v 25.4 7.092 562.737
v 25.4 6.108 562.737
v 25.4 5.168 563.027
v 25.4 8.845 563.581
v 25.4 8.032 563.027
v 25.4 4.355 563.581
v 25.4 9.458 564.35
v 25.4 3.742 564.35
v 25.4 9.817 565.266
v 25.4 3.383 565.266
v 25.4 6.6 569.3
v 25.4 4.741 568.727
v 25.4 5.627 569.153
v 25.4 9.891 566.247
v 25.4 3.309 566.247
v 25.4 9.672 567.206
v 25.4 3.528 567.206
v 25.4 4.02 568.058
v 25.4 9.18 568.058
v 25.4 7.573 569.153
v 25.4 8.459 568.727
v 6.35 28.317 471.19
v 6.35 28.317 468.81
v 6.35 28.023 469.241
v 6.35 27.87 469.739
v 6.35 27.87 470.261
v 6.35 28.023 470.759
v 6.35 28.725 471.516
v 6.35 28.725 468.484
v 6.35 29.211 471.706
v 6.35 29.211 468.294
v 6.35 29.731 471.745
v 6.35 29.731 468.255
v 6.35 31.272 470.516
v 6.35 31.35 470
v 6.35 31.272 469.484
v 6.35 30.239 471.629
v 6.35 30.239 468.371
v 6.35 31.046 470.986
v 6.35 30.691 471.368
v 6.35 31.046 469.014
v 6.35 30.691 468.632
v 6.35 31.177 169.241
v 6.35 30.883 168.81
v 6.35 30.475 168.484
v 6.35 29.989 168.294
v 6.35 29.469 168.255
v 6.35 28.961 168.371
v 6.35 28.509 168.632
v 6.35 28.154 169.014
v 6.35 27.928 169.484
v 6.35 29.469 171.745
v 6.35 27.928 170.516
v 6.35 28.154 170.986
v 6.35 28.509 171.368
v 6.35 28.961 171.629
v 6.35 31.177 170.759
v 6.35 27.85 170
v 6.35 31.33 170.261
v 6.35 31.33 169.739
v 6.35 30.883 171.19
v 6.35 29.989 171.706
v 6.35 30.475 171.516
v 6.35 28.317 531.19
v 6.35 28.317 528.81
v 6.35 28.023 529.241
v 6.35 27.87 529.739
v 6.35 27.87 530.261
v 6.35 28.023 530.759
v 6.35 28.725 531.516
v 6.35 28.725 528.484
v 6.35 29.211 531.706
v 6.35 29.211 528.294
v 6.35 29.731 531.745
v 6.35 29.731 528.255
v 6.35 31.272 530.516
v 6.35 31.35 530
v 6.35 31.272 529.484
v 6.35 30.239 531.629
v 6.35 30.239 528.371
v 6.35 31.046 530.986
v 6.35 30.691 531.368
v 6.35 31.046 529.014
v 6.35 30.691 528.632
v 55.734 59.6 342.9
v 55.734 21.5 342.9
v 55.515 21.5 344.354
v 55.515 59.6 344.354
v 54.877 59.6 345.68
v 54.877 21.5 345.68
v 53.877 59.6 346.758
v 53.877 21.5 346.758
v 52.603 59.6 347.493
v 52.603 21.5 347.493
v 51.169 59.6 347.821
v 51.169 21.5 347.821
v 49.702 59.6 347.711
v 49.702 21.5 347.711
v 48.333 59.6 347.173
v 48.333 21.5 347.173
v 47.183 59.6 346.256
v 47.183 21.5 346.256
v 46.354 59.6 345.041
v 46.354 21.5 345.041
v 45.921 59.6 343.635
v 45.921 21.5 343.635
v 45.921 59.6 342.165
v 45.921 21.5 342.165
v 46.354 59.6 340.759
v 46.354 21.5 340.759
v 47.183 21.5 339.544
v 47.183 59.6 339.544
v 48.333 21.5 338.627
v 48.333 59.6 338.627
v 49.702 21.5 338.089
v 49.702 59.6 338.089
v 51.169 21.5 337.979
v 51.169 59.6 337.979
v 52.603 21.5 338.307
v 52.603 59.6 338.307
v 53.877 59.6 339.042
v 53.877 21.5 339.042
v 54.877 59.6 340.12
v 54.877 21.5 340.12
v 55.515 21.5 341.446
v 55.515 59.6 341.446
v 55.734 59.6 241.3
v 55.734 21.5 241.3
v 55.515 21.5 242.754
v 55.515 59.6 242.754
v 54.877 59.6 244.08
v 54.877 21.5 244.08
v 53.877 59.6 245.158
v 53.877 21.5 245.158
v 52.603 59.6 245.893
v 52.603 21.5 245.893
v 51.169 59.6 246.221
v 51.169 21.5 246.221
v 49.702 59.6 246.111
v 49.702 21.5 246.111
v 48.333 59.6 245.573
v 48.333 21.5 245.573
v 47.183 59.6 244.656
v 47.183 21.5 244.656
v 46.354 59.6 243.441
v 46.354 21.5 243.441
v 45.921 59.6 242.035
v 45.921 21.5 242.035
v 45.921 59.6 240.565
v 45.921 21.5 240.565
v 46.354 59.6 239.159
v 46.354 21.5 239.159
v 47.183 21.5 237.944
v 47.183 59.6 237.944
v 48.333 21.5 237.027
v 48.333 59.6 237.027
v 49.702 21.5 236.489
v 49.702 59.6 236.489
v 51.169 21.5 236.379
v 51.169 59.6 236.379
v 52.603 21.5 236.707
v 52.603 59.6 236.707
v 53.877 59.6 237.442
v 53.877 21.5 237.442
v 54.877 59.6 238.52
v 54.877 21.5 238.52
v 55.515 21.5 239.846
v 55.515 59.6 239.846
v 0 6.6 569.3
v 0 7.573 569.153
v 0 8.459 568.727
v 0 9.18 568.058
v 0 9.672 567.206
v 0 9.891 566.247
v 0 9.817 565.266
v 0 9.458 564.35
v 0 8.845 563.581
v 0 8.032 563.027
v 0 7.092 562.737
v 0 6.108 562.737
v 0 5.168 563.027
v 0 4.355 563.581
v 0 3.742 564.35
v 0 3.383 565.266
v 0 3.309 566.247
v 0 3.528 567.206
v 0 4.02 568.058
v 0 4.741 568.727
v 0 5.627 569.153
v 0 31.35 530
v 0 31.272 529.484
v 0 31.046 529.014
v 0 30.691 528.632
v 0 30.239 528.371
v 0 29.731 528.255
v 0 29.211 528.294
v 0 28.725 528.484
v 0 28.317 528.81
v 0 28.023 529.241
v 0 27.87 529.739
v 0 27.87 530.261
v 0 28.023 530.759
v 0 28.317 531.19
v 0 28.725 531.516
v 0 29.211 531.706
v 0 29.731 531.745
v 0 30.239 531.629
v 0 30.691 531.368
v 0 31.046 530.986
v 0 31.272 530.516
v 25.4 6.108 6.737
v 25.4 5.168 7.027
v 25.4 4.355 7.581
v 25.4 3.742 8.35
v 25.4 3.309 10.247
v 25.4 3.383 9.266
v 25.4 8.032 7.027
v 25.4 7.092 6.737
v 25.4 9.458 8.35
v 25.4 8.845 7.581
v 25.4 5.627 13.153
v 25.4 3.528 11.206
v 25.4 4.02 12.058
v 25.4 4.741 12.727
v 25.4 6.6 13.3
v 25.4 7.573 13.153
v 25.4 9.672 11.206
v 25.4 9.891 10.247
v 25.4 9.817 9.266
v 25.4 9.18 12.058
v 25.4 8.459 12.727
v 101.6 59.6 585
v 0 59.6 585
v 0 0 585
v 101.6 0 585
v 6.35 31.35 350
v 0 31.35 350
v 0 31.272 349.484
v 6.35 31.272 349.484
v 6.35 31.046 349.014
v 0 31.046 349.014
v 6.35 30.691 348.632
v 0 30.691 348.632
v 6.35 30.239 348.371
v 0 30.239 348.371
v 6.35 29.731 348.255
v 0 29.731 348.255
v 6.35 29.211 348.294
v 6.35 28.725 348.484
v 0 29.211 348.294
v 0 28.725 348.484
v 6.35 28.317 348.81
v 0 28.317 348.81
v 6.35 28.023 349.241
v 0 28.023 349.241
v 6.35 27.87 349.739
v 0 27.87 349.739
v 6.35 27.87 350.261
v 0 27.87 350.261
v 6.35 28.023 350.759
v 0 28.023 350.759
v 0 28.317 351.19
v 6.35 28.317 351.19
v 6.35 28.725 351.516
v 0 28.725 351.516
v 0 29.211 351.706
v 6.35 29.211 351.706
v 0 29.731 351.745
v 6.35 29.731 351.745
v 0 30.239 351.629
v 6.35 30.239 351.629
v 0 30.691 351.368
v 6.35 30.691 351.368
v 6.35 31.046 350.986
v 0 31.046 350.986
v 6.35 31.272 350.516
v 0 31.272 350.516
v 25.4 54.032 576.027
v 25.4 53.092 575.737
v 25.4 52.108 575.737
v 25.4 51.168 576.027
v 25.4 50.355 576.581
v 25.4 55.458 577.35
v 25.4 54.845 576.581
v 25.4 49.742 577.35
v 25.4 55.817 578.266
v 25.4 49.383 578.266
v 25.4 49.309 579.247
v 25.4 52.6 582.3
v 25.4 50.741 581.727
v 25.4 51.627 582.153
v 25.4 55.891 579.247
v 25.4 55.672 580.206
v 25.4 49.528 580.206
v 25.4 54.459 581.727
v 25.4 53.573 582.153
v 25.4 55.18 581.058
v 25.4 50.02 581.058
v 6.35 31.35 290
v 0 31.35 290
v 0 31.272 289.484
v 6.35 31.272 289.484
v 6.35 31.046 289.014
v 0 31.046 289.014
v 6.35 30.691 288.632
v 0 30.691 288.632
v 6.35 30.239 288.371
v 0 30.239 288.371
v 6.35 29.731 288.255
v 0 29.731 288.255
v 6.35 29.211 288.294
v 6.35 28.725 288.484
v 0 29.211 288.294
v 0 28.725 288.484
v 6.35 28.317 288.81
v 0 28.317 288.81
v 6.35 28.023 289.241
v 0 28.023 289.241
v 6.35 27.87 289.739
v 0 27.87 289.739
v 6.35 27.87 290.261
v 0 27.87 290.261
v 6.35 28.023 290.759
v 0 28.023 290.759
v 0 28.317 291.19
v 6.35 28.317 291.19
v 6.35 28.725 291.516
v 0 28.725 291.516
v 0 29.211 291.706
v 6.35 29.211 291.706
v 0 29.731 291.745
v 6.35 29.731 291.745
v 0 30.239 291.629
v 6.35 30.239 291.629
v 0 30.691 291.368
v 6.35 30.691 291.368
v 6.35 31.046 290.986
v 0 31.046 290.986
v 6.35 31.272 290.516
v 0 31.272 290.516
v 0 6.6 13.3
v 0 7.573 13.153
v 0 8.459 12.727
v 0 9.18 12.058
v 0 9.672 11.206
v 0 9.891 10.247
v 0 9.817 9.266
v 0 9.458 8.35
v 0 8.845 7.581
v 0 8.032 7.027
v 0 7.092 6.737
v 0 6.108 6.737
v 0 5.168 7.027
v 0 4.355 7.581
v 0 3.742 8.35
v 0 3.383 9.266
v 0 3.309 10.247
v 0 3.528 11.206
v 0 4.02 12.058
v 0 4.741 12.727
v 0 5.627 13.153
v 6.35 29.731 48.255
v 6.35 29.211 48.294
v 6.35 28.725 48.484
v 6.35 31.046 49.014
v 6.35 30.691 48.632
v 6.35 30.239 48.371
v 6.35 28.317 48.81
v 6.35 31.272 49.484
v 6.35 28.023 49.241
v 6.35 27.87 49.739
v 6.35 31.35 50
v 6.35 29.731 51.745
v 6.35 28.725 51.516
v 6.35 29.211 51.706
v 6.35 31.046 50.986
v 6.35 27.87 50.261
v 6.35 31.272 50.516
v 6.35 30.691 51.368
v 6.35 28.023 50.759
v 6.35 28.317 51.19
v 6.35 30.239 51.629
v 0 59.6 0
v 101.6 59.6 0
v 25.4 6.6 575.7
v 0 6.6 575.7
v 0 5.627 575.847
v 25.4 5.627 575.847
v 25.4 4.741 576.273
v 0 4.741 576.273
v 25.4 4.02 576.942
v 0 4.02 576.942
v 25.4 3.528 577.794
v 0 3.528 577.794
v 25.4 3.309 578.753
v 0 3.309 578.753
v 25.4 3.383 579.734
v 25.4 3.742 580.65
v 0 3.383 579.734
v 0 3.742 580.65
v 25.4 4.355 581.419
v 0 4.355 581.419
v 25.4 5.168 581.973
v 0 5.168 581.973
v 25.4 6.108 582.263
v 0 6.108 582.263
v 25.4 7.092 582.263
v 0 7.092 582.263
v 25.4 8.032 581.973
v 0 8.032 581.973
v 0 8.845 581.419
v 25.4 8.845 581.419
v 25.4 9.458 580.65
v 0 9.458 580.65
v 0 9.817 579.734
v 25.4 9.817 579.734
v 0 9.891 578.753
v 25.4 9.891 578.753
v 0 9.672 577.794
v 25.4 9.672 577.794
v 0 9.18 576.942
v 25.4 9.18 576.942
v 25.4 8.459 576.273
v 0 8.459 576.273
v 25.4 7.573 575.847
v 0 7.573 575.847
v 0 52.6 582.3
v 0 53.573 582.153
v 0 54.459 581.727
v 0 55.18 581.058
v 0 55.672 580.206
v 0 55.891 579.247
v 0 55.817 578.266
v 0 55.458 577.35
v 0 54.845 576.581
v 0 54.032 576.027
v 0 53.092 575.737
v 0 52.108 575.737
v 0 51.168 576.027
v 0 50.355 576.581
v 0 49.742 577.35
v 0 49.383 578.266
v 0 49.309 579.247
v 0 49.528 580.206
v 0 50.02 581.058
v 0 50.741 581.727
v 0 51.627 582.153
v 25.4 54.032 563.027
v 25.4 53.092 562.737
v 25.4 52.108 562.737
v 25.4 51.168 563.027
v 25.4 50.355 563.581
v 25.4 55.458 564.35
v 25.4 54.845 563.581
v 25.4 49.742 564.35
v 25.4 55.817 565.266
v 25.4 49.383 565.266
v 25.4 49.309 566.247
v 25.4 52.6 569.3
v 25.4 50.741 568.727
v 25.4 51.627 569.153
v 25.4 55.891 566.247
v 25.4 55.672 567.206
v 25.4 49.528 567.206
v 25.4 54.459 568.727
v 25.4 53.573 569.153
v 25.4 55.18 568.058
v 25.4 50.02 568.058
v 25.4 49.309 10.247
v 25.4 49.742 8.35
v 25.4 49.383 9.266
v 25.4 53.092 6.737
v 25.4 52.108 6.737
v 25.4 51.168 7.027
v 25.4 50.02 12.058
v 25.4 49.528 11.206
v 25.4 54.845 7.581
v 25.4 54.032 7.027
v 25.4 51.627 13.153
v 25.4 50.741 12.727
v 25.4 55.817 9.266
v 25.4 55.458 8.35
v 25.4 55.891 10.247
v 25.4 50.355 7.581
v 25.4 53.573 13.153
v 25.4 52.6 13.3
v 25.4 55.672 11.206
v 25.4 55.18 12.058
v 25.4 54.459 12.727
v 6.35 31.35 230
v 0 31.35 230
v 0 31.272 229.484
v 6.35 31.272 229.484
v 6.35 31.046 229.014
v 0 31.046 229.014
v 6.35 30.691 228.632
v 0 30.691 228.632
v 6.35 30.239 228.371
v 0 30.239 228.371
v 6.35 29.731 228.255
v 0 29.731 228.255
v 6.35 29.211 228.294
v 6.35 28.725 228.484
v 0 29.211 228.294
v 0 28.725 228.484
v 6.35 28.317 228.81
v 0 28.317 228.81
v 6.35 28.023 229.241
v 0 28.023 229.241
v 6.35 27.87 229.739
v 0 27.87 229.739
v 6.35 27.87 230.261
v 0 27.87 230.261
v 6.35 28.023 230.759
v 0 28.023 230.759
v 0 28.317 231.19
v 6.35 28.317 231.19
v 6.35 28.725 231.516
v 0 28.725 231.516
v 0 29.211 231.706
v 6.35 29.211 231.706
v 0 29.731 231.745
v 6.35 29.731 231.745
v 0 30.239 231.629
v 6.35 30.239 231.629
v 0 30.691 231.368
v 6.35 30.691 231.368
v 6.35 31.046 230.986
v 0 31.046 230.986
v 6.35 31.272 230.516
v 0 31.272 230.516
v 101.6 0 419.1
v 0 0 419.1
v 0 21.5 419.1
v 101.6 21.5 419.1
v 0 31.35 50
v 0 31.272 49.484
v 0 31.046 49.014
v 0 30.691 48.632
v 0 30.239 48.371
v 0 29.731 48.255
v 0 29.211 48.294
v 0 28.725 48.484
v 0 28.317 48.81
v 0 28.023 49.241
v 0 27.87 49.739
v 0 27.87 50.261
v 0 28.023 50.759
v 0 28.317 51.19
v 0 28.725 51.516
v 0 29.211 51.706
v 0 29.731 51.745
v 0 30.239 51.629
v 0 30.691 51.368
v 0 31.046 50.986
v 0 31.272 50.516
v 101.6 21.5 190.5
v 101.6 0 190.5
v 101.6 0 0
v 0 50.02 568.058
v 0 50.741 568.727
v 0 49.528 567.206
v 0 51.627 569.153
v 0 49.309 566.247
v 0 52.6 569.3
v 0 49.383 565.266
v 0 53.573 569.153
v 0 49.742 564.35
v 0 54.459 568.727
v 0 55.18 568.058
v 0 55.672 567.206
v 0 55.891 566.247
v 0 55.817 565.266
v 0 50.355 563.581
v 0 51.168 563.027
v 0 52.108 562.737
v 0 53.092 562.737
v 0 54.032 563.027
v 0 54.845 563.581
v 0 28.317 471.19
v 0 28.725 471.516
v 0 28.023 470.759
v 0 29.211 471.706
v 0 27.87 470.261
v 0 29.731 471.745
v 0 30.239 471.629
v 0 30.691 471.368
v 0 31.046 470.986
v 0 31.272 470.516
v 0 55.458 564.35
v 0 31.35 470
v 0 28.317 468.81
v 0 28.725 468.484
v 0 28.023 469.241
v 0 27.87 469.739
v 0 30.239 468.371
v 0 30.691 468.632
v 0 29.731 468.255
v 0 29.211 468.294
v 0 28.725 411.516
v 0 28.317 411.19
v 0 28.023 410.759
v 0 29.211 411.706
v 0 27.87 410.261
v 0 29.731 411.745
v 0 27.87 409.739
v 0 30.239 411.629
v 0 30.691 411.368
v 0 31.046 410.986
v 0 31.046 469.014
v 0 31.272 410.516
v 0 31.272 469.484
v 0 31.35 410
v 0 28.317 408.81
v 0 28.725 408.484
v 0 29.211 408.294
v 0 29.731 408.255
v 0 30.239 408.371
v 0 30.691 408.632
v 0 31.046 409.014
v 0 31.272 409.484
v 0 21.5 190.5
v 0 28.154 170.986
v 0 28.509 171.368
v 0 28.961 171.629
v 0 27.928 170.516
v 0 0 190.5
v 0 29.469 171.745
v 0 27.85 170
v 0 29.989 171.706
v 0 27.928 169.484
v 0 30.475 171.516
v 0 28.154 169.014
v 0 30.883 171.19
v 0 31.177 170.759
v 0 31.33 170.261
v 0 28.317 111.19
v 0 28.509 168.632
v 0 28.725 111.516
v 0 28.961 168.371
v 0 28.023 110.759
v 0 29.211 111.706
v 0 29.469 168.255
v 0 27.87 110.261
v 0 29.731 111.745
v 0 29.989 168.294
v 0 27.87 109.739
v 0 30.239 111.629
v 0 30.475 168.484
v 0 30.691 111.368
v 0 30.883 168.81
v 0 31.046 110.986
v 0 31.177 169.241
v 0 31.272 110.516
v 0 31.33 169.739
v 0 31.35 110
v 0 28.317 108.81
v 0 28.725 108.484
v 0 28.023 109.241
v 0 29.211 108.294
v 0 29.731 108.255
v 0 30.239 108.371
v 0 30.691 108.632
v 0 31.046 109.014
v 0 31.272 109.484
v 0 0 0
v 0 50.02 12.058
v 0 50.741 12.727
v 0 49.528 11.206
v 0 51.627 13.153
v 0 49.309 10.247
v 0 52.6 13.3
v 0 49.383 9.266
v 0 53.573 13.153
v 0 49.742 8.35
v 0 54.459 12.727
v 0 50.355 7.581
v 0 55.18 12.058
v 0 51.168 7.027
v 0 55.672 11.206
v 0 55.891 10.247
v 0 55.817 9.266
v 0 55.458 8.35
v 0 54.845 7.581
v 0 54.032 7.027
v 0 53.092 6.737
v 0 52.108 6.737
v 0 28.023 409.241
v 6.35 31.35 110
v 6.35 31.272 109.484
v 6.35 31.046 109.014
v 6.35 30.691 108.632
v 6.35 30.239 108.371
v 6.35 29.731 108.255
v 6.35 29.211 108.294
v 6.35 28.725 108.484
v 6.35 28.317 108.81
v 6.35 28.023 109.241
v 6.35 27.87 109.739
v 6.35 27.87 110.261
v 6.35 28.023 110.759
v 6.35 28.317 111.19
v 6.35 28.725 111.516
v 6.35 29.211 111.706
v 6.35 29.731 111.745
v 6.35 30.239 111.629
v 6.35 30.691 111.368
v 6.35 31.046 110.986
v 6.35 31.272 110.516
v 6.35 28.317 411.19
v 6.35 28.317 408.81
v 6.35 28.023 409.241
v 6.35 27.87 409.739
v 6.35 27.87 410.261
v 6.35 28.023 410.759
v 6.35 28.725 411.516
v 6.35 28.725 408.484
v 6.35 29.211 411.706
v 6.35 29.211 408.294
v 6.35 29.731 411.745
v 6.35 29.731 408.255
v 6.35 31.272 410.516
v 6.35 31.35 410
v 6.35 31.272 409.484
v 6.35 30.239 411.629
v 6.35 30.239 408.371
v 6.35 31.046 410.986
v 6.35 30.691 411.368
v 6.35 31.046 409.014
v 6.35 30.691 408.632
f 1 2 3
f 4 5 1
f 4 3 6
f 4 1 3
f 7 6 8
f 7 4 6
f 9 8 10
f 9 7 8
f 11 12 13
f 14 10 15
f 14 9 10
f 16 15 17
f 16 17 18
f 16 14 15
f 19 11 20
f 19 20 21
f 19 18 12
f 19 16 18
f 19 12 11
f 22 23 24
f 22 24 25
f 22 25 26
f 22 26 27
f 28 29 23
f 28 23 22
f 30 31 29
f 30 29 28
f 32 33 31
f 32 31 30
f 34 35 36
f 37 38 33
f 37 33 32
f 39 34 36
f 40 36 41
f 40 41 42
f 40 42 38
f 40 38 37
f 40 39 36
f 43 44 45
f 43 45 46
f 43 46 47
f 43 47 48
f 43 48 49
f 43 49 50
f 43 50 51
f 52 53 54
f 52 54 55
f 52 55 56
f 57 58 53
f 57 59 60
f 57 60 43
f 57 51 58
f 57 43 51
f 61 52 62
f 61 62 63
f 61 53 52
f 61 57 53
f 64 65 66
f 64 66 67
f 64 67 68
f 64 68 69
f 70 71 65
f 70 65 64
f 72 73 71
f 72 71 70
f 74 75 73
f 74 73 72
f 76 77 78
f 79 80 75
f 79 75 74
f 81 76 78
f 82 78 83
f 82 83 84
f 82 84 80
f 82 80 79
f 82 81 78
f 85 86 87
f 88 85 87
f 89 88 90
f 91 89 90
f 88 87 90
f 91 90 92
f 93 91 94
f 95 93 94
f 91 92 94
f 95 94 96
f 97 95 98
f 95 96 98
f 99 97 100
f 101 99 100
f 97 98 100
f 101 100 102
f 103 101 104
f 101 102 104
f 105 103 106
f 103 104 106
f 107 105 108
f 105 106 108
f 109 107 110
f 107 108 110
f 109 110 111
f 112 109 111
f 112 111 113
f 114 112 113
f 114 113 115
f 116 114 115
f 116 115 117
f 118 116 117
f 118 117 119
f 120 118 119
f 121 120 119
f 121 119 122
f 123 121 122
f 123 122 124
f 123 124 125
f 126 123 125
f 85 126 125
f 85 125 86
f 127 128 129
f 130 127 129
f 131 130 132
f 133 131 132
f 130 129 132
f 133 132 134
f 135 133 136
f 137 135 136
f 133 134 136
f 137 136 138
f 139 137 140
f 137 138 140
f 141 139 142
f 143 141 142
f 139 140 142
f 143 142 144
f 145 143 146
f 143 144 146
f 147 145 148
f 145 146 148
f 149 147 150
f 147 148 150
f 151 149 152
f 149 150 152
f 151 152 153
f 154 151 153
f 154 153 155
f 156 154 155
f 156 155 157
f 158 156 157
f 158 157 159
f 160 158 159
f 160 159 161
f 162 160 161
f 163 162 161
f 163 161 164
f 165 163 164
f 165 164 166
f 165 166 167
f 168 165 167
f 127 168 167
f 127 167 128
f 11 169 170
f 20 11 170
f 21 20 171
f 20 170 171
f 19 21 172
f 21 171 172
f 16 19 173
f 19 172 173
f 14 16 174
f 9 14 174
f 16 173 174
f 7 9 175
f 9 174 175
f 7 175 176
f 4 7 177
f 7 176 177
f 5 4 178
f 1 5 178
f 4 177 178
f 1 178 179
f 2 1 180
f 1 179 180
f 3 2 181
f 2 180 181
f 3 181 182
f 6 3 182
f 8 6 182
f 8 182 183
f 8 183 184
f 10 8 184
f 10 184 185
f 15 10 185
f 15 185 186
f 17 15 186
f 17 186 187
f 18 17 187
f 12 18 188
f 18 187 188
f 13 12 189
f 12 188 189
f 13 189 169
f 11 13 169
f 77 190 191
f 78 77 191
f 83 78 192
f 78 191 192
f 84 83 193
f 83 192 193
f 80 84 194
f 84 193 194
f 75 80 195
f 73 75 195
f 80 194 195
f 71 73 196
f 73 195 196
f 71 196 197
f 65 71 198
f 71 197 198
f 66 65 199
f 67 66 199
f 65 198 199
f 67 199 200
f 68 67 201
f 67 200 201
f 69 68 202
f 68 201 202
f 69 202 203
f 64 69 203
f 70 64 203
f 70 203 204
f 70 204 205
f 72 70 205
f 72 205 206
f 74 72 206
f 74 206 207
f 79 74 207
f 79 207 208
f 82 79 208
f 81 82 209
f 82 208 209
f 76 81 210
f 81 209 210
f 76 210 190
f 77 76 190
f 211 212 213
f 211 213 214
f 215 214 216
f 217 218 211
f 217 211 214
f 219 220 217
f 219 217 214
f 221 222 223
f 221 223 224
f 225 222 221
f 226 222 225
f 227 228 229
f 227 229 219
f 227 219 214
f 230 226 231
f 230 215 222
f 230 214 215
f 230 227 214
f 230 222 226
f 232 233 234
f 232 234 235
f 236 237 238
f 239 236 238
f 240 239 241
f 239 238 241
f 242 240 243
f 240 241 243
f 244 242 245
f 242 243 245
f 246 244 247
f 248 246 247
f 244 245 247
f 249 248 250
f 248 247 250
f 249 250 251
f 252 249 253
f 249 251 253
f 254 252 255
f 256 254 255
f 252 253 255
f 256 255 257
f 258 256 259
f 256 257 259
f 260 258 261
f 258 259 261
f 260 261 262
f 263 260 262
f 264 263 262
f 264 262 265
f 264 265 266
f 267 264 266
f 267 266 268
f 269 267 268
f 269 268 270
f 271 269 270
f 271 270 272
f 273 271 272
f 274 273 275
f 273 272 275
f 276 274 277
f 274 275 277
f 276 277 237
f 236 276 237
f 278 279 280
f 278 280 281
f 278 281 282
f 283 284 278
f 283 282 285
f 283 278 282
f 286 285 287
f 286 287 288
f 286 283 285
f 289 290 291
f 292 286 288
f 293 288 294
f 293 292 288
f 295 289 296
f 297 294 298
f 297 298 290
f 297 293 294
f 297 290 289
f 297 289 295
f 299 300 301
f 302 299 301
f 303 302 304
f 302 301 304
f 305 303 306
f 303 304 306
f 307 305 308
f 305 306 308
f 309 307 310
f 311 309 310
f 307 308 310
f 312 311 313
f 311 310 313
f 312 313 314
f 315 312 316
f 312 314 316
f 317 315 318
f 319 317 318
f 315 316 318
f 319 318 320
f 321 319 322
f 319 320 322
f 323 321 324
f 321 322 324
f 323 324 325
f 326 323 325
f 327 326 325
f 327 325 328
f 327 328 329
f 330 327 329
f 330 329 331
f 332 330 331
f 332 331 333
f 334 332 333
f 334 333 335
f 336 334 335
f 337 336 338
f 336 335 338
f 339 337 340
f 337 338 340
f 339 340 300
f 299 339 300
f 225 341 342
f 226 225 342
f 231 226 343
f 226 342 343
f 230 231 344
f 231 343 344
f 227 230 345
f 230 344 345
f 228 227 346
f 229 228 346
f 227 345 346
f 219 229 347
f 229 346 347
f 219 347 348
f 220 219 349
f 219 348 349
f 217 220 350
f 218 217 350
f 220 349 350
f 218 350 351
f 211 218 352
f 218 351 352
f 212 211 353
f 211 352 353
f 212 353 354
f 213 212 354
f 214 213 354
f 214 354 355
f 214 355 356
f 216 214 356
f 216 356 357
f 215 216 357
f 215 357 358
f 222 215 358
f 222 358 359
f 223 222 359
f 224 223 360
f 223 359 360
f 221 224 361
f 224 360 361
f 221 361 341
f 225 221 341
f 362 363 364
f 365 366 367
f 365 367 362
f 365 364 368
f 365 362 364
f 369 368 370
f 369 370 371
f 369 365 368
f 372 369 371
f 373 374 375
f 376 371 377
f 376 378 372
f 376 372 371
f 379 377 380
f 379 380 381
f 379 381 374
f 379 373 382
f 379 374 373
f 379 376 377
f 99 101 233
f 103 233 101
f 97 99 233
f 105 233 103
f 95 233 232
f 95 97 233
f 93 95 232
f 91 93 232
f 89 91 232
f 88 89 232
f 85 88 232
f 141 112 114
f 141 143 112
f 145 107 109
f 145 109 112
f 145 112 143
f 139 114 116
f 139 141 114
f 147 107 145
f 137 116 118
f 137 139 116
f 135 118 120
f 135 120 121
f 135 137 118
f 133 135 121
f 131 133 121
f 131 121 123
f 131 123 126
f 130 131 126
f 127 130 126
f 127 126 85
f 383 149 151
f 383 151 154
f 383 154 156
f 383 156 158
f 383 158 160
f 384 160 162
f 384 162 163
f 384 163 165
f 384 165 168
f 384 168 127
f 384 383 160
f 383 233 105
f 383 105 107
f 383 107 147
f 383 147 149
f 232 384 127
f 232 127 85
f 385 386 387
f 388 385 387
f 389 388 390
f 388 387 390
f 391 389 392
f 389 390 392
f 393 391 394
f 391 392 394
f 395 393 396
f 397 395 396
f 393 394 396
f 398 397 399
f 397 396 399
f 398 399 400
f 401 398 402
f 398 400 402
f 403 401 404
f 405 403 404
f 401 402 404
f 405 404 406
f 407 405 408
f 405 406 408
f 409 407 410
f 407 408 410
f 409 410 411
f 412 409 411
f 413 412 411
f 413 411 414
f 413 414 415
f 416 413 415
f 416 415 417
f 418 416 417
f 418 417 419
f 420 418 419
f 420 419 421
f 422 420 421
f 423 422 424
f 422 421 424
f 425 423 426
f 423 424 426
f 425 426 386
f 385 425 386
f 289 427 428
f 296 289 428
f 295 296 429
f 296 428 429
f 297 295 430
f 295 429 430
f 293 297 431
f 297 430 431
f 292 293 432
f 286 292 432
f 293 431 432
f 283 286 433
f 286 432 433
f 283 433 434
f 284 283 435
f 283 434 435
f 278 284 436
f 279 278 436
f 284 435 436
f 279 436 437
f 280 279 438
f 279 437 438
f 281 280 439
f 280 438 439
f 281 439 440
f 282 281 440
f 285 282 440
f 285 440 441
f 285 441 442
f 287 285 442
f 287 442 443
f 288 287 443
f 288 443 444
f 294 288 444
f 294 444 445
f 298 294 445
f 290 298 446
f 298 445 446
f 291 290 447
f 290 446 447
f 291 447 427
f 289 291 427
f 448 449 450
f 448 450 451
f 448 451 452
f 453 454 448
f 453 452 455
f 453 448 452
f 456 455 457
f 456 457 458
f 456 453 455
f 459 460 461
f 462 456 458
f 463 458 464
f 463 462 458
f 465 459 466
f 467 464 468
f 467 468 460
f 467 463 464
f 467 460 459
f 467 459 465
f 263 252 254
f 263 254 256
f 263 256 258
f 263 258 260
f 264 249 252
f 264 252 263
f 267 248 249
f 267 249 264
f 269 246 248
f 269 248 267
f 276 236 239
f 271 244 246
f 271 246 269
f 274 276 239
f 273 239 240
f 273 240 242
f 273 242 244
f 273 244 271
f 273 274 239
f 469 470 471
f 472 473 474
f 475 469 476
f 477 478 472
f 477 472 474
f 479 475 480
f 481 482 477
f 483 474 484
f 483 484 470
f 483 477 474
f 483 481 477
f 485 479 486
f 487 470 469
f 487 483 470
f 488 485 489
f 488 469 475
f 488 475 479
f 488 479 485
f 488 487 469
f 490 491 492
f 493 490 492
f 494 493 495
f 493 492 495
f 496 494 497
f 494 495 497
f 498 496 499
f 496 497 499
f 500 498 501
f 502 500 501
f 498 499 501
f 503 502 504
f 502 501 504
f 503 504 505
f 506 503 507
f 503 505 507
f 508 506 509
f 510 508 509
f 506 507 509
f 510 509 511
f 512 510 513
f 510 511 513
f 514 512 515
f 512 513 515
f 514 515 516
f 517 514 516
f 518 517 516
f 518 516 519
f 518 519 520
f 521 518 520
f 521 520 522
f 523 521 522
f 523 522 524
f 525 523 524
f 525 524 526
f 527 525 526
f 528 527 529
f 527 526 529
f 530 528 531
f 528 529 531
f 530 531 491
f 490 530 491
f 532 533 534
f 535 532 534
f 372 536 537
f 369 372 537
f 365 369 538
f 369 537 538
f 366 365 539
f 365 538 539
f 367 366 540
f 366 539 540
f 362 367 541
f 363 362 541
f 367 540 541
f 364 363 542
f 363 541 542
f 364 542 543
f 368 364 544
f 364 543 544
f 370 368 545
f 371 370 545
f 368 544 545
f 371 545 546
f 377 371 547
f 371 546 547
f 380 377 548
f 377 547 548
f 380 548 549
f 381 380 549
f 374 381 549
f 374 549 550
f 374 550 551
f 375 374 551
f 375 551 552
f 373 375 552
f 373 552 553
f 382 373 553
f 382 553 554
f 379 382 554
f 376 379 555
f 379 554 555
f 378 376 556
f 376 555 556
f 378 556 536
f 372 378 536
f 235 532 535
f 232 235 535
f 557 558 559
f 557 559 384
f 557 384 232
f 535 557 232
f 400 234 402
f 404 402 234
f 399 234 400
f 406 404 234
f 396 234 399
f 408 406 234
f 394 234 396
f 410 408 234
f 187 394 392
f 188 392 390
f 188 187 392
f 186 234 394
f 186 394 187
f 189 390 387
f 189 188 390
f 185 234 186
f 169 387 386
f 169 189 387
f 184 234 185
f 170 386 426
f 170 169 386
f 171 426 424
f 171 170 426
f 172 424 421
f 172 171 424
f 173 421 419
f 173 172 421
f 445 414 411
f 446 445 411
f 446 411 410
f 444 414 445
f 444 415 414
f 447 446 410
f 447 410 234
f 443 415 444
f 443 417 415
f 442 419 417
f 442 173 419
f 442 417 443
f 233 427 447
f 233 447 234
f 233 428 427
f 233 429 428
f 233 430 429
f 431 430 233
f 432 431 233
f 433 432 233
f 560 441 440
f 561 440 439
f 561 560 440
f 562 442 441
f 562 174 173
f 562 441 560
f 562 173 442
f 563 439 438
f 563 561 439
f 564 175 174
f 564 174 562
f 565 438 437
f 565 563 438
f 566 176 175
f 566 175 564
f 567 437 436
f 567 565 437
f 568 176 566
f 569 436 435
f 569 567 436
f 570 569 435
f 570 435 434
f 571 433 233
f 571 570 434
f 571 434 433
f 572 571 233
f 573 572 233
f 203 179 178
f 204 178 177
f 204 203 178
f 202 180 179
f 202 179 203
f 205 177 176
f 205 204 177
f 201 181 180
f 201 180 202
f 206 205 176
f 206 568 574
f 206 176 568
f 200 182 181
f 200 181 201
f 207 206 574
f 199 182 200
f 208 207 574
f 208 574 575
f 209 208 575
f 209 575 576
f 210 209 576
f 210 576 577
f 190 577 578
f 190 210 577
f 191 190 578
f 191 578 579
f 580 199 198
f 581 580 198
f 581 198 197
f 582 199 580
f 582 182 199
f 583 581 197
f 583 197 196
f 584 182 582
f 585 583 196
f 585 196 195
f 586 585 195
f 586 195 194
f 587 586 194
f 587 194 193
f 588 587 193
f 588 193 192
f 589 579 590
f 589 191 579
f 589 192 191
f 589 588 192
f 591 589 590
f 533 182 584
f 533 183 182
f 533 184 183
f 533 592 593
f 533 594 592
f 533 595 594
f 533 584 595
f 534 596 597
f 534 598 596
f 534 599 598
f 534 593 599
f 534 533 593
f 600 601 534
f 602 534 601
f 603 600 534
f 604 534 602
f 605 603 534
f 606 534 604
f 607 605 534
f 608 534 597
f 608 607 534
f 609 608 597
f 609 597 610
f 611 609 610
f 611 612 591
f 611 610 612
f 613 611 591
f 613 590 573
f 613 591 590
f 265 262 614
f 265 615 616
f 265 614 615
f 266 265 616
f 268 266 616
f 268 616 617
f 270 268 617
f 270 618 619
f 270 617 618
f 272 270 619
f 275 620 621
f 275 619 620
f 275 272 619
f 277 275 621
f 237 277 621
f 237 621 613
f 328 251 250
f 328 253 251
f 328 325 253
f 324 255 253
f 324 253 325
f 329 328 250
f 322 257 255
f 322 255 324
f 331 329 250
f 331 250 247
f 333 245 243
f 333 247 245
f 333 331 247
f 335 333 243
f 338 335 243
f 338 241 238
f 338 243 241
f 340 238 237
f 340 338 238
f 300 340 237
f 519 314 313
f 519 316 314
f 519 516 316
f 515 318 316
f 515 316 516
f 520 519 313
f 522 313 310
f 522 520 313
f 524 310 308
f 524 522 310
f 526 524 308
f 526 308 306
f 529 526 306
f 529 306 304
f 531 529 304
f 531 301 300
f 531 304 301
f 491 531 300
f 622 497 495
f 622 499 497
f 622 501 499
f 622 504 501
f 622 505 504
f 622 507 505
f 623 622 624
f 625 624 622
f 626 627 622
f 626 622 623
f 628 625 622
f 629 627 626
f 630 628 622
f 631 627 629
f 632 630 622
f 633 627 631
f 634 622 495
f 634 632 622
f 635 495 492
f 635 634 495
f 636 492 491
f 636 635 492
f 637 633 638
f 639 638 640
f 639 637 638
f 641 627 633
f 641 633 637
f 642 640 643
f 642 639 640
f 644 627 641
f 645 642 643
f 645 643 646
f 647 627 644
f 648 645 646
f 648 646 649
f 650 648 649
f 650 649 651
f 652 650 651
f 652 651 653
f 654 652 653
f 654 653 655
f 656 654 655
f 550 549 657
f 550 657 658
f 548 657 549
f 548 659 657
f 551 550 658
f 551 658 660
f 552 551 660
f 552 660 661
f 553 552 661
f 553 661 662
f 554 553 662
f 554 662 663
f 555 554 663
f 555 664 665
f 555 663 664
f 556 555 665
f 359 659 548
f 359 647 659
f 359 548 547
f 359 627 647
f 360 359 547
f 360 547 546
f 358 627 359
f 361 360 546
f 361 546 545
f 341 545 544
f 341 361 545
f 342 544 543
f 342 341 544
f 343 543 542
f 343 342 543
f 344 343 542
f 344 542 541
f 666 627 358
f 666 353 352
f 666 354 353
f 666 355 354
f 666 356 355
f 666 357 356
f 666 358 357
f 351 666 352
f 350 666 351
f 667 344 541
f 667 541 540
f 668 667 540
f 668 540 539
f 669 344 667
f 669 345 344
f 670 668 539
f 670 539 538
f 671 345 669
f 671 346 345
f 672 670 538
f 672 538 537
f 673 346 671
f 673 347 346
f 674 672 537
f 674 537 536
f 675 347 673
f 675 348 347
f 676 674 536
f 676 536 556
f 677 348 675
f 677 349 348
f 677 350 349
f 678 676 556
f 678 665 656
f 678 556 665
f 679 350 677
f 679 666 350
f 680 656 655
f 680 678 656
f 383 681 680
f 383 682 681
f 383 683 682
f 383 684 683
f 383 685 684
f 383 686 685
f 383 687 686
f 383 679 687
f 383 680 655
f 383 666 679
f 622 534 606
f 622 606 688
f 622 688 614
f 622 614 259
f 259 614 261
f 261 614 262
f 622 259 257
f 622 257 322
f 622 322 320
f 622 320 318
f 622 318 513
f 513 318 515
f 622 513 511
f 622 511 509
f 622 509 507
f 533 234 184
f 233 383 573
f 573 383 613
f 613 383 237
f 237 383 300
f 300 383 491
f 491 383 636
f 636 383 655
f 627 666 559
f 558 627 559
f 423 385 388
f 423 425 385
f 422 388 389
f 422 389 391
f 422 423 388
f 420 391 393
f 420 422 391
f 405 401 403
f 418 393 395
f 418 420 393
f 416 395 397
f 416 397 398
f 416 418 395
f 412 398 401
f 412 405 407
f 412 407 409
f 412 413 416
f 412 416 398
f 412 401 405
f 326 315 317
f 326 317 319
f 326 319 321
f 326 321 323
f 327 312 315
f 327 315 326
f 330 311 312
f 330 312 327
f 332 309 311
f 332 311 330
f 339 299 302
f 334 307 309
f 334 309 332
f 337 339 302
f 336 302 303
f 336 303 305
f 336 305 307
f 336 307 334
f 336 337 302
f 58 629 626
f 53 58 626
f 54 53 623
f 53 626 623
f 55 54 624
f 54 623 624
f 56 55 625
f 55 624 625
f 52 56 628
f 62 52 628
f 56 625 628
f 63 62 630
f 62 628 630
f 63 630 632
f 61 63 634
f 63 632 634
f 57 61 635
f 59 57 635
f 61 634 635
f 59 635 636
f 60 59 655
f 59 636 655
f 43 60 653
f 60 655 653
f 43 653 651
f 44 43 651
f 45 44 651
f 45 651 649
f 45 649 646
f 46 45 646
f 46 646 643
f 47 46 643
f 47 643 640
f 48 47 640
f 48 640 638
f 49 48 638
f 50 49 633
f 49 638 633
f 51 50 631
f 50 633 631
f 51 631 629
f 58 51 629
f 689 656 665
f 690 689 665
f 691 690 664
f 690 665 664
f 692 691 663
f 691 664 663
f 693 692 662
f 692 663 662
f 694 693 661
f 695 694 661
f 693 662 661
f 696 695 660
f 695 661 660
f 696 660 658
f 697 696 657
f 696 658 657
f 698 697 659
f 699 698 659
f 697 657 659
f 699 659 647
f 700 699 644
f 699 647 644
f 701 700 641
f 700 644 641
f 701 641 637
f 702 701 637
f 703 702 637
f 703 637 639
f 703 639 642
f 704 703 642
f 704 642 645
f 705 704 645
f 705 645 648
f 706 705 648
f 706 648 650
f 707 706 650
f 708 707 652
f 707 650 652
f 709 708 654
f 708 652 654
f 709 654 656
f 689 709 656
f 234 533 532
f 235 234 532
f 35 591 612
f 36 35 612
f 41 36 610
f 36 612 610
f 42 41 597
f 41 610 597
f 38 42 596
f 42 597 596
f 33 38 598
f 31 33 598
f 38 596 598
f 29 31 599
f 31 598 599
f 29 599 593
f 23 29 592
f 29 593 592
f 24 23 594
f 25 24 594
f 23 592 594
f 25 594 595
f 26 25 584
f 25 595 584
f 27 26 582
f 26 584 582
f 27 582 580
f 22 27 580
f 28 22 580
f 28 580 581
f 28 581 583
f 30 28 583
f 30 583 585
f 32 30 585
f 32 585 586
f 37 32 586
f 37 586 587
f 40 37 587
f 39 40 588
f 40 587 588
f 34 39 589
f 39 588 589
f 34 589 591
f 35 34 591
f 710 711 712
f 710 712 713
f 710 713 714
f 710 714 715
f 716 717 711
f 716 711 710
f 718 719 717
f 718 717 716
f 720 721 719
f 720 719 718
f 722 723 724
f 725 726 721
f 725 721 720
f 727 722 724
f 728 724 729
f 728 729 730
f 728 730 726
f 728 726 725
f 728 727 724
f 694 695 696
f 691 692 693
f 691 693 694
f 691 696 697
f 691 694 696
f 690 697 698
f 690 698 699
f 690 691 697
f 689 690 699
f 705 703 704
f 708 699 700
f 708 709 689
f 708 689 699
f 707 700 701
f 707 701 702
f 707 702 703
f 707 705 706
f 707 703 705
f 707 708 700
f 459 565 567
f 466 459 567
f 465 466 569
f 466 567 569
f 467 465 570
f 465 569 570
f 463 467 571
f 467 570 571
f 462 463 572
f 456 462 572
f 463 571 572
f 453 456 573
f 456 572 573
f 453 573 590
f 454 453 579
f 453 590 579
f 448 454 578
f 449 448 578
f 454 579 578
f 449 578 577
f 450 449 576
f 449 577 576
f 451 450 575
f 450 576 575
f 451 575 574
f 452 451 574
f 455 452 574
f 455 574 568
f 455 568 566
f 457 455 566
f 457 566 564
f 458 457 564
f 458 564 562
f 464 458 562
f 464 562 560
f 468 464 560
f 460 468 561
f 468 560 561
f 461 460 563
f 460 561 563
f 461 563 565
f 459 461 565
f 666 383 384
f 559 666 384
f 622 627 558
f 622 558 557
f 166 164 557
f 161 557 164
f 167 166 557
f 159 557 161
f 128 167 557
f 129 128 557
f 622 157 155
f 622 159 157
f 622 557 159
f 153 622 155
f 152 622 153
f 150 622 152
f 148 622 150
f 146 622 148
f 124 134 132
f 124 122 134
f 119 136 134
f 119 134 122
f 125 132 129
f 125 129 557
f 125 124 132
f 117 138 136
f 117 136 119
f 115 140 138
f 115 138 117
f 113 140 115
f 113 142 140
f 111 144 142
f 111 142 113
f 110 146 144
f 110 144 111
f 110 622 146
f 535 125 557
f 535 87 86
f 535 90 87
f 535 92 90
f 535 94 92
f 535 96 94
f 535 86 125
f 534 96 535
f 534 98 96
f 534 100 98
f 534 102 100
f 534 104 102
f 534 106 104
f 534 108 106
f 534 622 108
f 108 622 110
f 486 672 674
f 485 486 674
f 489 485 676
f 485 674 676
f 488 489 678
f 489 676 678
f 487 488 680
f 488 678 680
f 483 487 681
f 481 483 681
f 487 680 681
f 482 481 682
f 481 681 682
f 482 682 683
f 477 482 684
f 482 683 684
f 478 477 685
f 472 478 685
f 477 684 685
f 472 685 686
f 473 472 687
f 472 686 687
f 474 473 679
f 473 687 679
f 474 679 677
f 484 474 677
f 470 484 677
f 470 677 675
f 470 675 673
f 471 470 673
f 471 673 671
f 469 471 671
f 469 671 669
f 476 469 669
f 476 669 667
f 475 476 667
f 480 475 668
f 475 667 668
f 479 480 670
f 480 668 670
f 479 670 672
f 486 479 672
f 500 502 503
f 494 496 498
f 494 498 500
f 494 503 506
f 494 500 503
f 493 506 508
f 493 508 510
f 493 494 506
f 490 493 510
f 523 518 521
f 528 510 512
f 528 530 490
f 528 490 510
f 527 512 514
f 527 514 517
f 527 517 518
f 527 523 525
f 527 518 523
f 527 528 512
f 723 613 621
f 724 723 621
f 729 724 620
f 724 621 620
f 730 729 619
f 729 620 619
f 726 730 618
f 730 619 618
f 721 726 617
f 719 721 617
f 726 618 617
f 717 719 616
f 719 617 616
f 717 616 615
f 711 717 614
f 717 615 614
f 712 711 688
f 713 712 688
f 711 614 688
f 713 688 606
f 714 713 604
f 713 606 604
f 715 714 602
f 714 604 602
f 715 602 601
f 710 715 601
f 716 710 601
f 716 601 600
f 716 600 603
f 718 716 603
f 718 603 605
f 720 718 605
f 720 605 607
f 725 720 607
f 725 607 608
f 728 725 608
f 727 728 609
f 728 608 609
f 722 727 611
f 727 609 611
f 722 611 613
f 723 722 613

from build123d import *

# Parameters (mm, degrees)
SKETCH1_W           = 101.6
SKETCH1_H           = 59.6
BOSS_EXTRUDE1_DEPTH = 585.0001
SKETCH2_W           = 228.6
SKETCH2_H           = 21.5
CUT_EXTRUDE1_DEPTH  = 102.6
CUT_EXTRUDE4_DEPTH  = 6.35
CUT_EXTRUDE5_DEPTH  = 25.4
SKETCH6_R           = 4.934351916
CUT_EXTRUDE6_DEPTH  = 39.1


with BuildPart() as part:
    # Sketch1 → Boss-Extrude1 (new body)
    with BuildSketch(Plane.XY):
        with Locations((50.8, 29.8)):
            Rectangle(SKETCH1_W, SKETCH1_H)
    extrude(amount=BOSS_EXTRUDE1_DEPTH)

    # Sketch2 → Cut-Extrude1 (cut, through all)
    with BuildSketch(Plane.ZY):
        with Locations((304.8, 10.75)):
            Rectangle(SKETCH2_W, SKETCH2_H)
    extrude(amount=-CUT_EXTRUDE1_DEPTH, mode=Mode.SUBTRACT)

    # Sketch5 → Cut-Extrude4 (cut)
    with BuildSketch(Plane.ZY):
        with BuildLine():
            ThreePointArc((170, 31.35), (168.25, 29.6), (170, 27.85))
            ThreePointArc((170, 27.85), (171.75, 29.6), (170, 31.35))
        make_face()
        with BuildLine():
            ThreePointArc((110, 27.85), (111.75, 29.6), (110, 31.35))
            ThreePointArc((110, 31.35), (108.25, 29.6), (110, 27.85))
        make_face()
        with BuildLine():
            ThreePointArc((50, 27.85), (51.75, 29.6), (50, 31.35))
            ThreePointArc((50, 31.35), (48.25, 29.6), (50, 27.85))
        make_face()
        with BuildLine():
            ThreePointArc((530, 27.85), (531.75, 29.6), (530, 31.35))
            ThreePointArc((530, 31.35), (528.25, 29.6), (530, 27.85))
        make_face()
        with BuildLine():
            ThreePointArc((470, 27.85), (471.75, 29.6), (470, 31.35))
            ThreePointArc((470, 31.35), (468.25, 29.6), (470, 27.85))
        make_face()
        with BuildLine():
            ThreePointArc((410, 27.85), (411.75, 29.6), (410, 31.35))
            ThreePointArc((410, 31.35), (408.25, 29.6), (410, 27.85))
        make_face()
        with BuildLine():
            ThreePointArc((350, 27.85), (351.75, 29.6), (350, 31.35))
            ThreePointArc((350, 31.35), (348.25, 29.6), (350, 27.85))
        make_face()
        with BuildLine():
            ThreePointArc((290, 27.85), (291.75, 29.6), (290, 31.35))
            ThreePointArc((290, 31.35), (288.25, 29.6), (290, 27.85))
        make_face()
        with BuildLine():
            ThreePointArc((230, 27.85), (231.75, 29.6), (230, 31.35))
            ThreePointArc((230, 31.35), (228.25, 29.6), (230, 27.85))
        make_face()
    extrude(amount=-CUT_EXTRUDE4_DEPTH, mode=Mode.SUBTRACT)

    # Sketch5<3> → Cut-Extrude5 (cut)
    with BuildSketch(Plane.ZY):
        with BuildLine():
            ThreePointArc((562.7, 6.6), (566, 3.3), (569.3, 6.6))
            ThreePointArc((569.3, 6.6), (566, 9.9), (562.7, 6.6))
        make_face()
        with BuildLine():
            ThreePointArc((582.3, 6.6), (579, 9.9), (575.7, 6.6))
            ThreePointArc((575.7, 6.6), (579, 3.3), (582.3, 6.6))
        make_face()
        with BuildLine():
            ThreePointArc((575.7, 52.6), (579, 49.3), (582.3, 52.6))
            ThreePointArc((582.3, 52.6), (579, 55.9), (575.7, 52.6))
        make_face()
        with BuildLine():
            ThreePointArc((562.7, 52.6), (566, 49.3), (569.3, 52.6))
            ThreePointArc((569.3, 52.6), (566, 55.9), (562.7, 52.6))
        make_face()
        with BuildLine():
            ThreePointArc((6.7, 6.6), (10, 3.3), (13.3, 6.6))
            ThreePointArc((13.3, 6.6), (10, 9.9), (6.7, 6.6))
        make_face()
        with BuildLine():
            ThreePointArc((6.7, 52.6), (10, 49.3), (13.3, 52.6))
            ThreePointArc((13.3, 52.6), (10, 55.9), (6.7, 52.6))
        make_face()
    extrude(amount=-CUT_EXTRUDE5_DEPTH, mode=Mode.SUBTRACT)

    # Sketch6 → Cut-Extrude6 (cut, through all)
    with BuildSketch(Plane.XZ.offset(-21.5)):
        with Locations((50.8, 342.9)):
            Circle(SKETCH6_R)
        with Locations((50.8, 241.3)):
            Circle(SKETCH6_R)
    extrude(amount=-CUT_EXTRUDE6_DEPTH, mode=Mode.SUBTRACT)


solid = part.part
